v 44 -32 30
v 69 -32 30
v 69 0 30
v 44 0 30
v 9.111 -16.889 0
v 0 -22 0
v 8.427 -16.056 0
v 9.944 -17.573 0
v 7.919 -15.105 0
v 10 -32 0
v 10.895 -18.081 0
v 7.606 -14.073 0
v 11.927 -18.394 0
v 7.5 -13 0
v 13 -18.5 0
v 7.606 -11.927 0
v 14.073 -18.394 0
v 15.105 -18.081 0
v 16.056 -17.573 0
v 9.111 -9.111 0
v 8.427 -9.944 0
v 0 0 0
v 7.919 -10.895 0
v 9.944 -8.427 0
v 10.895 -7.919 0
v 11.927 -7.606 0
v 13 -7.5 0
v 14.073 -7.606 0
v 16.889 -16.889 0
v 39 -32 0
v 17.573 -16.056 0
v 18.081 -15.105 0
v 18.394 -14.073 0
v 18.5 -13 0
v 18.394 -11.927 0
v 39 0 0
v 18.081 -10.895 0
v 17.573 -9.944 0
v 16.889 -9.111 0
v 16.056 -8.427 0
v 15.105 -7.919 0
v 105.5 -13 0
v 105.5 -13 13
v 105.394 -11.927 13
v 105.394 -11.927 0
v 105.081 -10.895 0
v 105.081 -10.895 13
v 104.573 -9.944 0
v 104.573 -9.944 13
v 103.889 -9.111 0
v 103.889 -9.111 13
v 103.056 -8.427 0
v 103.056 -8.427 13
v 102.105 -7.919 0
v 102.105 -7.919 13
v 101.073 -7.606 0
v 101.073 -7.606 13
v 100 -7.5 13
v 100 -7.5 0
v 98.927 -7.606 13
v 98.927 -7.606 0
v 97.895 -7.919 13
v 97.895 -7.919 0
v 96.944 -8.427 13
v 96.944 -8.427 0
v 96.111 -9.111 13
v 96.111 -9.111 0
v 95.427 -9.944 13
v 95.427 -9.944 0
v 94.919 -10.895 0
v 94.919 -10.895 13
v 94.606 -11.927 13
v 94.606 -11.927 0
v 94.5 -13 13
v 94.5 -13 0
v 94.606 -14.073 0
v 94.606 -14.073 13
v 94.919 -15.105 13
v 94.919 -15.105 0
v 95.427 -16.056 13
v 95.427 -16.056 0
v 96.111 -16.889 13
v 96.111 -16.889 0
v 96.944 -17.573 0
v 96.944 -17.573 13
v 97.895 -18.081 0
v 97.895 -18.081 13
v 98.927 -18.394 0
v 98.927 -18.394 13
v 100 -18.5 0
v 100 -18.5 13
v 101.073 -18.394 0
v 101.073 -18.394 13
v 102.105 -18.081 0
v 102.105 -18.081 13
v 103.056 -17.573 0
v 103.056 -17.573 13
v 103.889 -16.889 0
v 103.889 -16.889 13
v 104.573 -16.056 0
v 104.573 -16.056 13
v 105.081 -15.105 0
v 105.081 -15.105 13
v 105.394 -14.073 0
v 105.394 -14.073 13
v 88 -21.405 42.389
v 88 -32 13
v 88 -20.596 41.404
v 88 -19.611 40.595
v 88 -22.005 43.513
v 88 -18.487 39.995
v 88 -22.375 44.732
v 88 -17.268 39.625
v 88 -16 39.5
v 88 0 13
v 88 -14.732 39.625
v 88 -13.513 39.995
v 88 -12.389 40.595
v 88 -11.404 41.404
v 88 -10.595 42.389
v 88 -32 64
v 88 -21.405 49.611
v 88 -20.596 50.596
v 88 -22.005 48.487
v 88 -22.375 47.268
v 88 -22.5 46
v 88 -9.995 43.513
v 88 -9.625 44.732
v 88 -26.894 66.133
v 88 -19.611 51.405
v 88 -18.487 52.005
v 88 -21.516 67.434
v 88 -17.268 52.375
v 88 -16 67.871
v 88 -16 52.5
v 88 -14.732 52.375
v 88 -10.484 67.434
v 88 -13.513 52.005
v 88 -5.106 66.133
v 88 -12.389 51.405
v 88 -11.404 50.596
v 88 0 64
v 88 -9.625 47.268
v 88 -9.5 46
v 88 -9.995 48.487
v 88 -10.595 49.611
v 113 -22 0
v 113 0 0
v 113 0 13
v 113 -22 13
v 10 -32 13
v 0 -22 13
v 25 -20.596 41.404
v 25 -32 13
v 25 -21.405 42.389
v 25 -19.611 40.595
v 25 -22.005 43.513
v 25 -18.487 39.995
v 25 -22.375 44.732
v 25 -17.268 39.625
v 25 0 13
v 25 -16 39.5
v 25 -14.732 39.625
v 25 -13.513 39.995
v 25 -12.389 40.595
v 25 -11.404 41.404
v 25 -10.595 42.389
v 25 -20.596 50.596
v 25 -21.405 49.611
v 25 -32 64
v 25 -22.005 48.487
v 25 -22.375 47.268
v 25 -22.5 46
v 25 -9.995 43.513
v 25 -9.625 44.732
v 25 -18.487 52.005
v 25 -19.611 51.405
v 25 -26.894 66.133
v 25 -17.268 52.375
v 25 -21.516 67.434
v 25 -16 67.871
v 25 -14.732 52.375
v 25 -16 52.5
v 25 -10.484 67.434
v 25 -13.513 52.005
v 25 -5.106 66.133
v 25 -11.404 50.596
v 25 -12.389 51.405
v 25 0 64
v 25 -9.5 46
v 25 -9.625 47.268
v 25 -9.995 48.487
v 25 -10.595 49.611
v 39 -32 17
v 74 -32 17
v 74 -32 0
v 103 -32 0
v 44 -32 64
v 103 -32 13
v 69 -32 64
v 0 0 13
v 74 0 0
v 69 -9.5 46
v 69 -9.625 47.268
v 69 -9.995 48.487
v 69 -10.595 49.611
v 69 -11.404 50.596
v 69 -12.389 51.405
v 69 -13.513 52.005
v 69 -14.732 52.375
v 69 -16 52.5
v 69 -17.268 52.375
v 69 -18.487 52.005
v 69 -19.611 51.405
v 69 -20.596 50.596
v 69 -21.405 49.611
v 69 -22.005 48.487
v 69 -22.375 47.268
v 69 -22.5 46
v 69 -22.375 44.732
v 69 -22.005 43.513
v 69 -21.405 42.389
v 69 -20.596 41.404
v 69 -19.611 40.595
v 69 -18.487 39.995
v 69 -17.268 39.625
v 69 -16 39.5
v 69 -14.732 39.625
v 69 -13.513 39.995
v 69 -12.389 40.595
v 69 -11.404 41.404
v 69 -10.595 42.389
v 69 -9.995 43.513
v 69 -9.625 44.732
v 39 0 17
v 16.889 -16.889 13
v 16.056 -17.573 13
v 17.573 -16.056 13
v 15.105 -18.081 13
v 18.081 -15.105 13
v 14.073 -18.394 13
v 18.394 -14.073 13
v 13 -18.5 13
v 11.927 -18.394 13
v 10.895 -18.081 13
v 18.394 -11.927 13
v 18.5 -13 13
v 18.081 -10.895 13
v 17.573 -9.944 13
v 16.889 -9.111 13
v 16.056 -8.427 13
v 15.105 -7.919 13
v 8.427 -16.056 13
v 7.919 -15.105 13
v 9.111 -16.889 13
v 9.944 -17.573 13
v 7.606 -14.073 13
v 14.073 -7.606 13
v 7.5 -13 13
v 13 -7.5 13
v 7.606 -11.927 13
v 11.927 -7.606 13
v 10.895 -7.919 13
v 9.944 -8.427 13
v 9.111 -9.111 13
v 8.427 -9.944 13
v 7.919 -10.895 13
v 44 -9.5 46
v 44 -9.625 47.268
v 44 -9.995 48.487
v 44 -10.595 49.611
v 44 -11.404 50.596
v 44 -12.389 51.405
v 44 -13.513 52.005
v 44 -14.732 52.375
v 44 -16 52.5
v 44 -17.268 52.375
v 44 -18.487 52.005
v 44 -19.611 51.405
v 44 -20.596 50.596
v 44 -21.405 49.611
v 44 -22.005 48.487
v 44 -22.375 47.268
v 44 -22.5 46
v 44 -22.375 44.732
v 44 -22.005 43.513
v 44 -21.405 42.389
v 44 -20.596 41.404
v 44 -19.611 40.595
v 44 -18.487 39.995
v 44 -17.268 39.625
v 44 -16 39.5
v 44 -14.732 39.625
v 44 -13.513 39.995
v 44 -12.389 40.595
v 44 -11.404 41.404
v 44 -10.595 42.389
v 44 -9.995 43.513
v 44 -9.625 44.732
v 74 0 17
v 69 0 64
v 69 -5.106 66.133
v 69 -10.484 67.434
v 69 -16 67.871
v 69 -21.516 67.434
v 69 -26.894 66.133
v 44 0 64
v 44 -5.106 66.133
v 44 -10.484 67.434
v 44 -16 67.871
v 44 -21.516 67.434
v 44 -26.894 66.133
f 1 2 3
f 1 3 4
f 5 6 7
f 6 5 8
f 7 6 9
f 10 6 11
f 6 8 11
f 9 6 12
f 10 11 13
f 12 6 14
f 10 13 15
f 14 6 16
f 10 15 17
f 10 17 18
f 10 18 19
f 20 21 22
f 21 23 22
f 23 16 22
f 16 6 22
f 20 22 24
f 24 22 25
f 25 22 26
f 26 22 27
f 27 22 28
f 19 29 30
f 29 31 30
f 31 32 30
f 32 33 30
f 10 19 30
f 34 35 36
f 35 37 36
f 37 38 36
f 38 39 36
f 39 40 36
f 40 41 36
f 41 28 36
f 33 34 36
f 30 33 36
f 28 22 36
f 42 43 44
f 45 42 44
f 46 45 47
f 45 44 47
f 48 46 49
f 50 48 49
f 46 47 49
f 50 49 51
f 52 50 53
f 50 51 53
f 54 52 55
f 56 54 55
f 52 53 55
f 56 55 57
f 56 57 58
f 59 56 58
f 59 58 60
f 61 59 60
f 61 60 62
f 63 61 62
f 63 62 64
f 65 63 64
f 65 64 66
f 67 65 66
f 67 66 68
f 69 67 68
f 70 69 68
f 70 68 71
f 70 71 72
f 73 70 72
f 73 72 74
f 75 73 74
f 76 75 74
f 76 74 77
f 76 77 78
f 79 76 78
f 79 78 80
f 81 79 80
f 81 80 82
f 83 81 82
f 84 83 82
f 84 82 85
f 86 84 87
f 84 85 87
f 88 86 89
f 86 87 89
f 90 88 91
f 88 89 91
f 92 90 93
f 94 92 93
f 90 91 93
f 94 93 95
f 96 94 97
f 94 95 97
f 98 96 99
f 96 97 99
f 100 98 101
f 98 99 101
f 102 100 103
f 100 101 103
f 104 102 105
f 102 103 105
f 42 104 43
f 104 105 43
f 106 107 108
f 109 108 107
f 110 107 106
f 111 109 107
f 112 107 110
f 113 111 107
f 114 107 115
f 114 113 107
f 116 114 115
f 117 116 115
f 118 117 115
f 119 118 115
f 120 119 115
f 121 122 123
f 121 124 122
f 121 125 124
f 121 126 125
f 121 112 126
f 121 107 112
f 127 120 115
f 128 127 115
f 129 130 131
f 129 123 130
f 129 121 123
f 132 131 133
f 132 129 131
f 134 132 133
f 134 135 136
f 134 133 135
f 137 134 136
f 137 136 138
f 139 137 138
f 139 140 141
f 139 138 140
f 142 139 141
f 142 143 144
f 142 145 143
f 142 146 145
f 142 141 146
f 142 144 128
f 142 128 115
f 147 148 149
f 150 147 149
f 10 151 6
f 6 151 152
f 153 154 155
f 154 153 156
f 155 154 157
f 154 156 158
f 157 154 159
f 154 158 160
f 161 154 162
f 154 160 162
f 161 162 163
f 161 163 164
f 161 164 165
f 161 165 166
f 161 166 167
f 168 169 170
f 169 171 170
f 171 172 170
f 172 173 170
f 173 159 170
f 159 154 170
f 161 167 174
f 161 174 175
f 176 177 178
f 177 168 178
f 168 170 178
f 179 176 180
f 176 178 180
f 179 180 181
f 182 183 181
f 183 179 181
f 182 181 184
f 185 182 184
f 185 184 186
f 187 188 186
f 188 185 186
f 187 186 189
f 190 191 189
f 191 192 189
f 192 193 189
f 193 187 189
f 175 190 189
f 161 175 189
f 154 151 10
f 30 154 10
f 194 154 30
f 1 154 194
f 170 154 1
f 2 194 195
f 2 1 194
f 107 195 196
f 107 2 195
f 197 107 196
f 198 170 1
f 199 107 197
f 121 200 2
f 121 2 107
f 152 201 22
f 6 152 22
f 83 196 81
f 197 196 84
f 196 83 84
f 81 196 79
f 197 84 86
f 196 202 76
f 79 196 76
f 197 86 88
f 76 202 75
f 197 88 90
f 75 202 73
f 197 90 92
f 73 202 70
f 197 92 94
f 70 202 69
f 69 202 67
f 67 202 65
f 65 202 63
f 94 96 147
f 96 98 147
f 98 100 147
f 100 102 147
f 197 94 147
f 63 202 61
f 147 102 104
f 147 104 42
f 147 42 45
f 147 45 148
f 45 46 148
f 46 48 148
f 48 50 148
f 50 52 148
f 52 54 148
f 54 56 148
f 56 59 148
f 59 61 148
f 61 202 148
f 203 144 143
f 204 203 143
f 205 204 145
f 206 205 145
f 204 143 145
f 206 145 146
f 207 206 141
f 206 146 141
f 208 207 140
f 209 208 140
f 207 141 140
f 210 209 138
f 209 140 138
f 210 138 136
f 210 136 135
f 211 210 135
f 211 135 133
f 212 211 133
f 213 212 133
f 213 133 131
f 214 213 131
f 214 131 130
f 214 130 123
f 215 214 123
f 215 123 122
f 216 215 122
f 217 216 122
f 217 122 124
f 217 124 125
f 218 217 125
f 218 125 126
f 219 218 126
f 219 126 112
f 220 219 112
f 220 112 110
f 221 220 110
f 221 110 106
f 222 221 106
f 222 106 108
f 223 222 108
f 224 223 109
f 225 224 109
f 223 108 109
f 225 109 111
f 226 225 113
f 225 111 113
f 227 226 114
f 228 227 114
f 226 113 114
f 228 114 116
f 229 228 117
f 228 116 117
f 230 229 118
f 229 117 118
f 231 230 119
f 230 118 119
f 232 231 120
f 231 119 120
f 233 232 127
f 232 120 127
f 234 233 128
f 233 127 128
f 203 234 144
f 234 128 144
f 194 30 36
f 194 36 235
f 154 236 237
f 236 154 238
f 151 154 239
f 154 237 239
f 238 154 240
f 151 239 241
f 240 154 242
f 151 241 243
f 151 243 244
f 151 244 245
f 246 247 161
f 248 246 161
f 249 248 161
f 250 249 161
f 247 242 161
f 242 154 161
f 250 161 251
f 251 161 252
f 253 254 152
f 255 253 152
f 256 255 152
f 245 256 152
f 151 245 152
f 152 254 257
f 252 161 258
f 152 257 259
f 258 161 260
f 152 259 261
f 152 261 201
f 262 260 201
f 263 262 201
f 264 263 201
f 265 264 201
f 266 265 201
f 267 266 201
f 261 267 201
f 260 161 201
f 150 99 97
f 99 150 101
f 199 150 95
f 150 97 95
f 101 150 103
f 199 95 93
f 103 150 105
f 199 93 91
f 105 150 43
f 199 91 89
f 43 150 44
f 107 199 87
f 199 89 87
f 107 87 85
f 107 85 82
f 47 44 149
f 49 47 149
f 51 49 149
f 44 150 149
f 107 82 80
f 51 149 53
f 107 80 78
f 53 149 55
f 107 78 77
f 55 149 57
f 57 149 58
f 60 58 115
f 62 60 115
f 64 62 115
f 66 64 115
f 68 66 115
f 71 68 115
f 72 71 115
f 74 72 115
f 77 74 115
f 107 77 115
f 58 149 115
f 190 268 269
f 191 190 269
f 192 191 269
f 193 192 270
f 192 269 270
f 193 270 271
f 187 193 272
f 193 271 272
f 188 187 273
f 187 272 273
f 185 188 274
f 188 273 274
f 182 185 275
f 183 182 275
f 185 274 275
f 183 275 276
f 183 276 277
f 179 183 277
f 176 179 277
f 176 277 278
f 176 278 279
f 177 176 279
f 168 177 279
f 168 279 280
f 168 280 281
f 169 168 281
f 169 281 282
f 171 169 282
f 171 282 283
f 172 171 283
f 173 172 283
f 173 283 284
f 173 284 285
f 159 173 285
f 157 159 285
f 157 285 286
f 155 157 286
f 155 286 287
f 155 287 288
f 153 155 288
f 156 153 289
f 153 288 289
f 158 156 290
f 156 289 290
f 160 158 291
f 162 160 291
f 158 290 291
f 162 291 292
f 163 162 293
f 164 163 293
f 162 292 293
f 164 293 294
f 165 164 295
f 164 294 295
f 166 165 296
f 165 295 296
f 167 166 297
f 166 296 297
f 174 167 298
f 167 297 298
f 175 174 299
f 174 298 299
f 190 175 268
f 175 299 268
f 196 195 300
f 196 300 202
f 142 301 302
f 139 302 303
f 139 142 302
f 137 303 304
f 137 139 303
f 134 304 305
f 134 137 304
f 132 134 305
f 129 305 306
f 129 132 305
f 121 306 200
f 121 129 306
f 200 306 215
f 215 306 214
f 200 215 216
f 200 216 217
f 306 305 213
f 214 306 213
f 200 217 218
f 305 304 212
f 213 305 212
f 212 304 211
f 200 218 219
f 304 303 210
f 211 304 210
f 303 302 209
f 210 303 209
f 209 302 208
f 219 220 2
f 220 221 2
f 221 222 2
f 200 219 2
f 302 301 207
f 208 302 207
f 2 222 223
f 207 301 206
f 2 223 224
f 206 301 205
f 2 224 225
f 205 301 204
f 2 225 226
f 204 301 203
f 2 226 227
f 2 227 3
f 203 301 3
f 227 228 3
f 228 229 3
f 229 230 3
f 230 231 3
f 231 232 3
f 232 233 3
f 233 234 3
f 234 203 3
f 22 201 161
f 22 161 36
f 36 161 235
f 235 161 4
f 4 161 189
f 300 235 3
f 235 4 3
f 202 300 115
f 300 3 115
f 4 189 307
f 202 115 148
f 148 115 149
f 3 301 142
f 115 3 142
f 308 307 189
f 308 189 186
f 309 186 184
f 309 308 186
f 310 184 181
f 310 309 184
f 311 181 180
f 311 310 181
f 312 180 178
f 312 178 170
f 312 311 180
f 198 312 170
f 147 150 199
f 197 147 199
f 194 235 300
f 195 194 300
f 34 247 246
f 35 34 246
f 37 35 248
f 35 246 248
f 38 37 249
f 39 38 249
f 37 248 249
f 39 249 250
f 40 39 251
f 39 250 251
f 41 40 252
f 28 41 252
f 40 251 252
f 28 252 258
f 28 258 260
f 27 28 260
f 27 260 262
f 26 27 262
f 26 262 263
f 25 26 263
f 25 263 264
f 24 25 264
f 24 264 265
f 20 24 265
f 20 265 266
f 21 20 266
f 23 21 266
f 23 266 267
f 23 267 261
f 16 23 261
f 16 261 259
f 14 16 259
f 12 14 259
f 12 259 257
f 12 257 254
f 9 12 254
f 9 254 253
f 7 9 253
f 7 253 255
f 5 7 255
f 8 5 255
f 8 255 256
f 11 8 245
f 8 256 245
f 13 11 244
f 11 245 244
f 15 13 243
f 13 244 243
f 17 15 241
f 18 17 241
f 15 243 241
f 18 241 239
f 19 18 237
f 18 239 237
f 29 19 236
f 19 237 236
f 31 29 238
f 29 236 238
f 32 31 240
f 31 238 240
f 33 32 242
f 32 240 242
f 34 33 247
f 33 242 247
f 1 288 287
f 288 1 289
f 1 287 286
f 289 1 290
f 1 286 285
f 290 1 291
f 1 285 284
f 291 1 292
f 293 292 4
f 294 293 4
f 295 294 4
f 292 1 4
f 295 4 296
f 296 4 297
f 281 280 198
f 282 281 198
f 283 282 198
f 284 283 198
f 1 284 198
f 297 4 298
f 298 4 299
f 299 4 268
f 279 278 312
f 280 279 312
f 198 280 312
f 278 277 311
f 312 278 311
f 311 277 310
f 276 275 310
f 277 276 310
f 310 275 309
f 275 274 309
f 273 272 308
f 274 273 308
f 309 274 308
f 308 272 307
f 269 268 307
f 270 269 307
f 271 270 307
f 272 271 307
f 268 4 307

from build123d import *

# Parameters (mm, degrees)
F1_DEPTH  = 32
F2_R      = 5.5
F3_DEPTH  = 13.001
F4_R      = 5.5
F5_DEPTH  = 13.001
F6_R      = 6.5
F7_DEPTH  = 88.001
F9_DEPTH  = 13.001
F11_DEPTH = 13.001
F14_DEPTH = 63
F17_DEPTH = 63
F18_W     = 25
F18_H     = 4.4557750225
F19_DEPTH = 32.001


with BuildPart() as f1:
    # F0 (on Front) → F1 (new body)
    with BuildSketch(Plane.XZ):
        Polygon((0, 13), (0, 0), (39, 0), (39, 17), (74, 17), (74, 0), (113, 0), (113, 13), (88, 13), (88, 64), (69, 64), (69, 30), (44, 30), (44, 64), (25, 64), (25, 13), align=None)
    extrude(amount=F1_DEPTH)

    # F2 (on face) → F3 (cut, through all)
    with BuildSketch(Plane.XY.offset(13)):
        with Locations((100, -13)):
            Circle(F2_R)
    extrude(amount=-F3_DEPTH, mode=Mode.SUBTRACT)

    # F4 (on face) → F5 (cut, through all)
    with BuildSketch(Plane.XY.offset(13)):
        with Locations((13, -13)):
            Circle(F4_R)
    extrude(amount=-F5_DEPTH, mode=Mode.SUBTRACT)

    # F6 (on face) → F7 (cut, through all)
    with BuildSketch(Plane.YZ.offset(88)):
        with Locations((-16, 46)):
            Circle(F6_R)
    extrude(amount=-F7_DEPTH, mode=Mode.SUBTRACT)

    # F8 (on face) → F9 (cut, through all)
    with BuildSketch(Plane.XY.offset(13)):
        Polygon((103, -32), (113, -32), (113, -22), align=None)
    extrude(amount=-F9_DEPTH, mode=Mode.SUBTRACT)

    # F10 (on face) → F11 (cut, through all)
    with BuildSketch(Plane.XY.offset(13)):
        Polygon((10, -32), (0, -22), (0, -32), align=None)
    extrude(amount=-F11_DEPTH, mode=Mode.SUBTRACT)

    # F16 (on face) → F17 (join)
    with BuildSketch(Plane.YZ.offset(88)):
        with BuildLine():
            Line((-32, 64), (0, 64))
            ThreePointArc((0, 64), (-16, 67.8712351675), (-32, 64))
        make_face()
    extrude(amount=-F17_DEPTH)

    # F18 (on Front) → F19 (cut, through all)
    with BuildSketch(Plane.XZ):
        with Locations((56.5, 66.2278875113)):
            Rectangle(F18_W, F18_H)
    extrude(amount=F19_DEPTH, mode=Mode.SUBTRACT)


with BuildPart() as f14:
    # F13 (on face) → F14 (new body)
    with BuildSketch(Plane.YZ.offset(88)):
        with BuildLine():
            Line((-32, 64), (0, 64))
            ThreePointArc((0, 64), (-16, 67.8712351675), (-32, 64))
        make_face()
    extrude(amount=-F14_DEPTH)


solid = f1.part
